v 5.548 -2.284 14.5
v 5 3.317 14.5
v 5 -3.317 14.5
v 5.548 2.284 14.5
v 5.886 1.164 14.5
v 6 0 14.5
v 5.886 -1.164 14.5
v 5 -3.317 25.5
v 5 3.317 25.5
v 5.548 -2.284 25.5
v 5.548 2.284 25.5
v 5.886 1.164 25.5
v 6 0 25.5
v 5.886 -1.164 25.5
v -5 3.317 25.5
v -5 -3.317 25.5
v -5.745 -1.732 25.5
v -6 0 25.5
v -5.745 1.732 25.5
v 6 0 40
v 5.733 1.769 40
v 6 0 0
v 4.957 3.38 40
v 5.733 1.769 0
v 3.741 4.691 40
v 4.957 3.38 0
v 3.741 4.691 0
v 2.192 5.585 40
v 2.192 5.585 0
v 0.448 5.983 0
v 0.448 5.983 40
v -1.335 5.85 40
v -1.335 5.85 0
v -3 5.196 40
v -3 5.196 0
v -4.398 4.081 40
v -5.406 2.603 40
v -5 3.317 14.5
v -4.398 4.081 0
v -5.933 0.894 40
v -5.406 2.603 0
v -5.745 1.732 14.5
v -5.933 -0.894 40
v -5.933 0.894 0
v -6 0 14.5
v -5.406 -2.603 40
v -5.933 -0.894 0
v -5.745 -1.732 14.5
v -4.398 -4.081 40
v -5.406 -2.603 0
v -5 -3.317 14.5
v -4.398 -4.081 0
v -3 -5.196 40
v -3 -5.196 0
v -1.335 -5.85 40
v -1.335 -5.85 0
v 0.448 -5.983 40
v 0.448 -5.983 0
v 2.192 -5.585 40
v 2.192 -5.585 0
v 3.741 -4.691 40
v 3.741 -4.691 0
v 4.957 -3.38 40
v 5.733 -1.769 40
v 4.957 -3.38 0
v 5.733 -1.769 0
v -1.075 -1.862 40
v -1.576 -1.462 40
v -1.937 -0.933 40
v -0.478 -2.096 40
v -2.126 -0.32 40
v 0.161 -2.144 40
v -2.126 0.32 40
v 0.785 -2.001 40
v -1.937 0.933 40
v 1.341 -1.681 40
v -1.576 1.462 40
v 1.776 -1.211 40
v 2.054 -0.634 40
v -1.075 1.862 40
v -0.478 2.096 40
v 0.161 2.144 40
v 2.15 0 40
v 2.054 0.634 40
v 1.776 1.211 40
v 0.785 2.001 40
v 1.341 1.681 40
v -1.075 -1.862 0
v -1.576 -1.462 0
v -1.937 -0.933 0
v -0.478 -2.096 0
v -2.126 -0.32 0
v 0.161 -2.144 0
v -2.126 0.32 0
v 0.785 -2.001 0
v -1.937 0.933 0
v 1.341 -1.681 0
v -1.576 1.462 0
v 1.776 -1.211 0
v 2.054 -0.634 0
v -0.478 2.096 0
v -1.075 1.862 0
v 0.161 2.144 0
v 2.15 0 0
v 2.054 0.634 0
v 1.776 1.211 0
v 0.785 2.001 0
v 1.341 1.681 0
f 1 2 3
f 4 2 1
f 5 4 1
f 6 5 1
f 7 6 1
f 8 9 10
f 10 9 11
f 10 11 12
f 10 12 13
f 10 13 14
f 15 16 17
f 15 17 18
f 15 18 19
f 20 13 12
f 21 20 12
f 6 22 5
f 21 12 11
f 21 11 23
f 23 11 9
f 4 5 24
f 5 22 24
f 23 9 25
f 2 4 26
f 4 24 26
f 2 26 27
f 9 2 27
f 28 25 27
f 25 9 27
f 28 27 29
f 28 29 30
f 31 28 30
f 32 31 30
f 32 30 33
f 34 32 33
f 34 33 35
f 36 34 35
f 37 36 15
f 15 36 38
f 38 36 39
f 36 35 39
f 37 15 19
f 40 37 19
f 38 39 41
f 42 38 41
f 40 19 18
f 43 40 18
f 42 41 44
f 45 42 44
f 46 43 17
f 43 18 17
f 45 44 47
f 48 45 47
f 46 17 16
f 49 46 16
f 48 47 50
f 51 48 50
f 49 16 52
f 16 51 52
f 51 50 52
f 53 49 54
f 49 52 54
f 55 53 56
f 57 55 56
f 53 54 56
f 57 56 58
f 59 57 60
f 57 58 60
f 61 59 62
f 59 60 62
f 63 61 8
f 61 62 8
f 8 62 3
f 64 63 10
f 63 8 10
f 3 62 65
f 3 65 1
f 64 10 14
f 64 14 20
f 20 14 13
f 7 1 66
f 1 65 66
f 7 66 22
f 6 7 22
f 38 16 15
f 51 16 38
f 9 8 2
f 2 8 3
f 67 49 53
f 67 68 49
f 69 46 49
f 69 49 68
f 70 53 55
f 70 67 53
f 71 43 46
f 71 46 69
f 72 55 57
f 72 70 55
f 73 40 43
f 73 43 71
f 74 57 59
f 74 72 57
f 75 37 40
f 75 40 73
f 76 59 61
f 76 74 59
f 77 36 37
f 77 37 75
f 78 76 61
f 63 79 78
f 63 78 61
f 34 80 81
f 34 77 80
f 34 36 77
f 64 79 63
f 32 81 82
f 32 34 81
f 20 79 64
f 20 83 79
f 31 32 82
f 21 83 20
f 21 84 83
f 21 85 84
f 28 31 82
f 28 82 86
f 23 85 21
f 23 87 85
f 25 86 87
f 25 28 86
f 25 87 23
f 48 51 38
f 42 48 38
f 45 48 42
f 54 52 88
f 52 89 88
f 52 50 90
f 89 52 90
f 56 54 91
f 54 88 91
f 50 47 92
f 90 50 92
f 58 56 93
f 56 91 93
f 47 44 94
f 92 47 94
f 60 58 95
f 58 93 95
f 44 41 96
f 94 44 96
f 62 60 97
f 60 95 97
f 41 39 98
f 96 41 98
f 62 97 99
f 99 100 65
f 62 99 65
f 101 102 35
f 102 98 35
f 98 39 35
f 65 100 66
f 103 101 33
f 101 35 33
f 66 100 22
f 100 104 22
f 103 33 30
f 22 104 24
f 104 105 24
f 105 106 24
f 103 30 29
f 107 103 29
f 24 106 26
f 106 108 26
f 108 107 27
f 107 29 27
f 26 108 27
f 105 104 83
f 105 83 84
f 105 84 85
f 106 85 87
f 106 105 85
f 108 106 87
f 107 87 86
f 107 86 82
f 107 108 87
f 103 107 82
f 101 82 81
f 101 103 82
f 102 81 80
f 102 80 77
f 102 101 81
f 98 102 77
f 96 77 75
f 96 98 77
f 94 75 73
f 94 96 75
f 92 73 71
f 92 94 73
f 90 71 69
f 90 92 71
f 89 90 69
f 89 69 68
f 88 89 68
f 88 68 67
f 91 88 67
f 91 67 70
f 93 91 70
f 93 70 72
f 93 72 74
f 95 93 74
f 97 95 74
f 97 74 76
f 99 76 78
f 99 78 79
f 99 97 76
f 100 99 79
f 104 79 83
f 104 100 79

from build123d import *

# Parameters (mm, degrees)
SKETCH_1_R               = 6
SKETCH_1_R_2             = 2.15
EXTRUDE_1_DEPTH          = 40
CUT_EXTRUDE_1_DEPTH      = 41.890096601
CUT_EXTRUDE_1_DEPTH_BACK = 41.890096601
SKETCH_2_W               = 1
SKETCH_2_H               = 11


with BuildPart() as part:
    # Эскиз1 → Бобышка-Вытянуть1 (new body)
    with BuildSketch(Plane.XY):
        Circle(SKETCH_1_R)
        Circle(SKETCH_1_R_2, mode=Mode.SUBTRACT)
    extrude(amount=EXTRUDE_1_DEPTH)

    # Эскиз2 → Вырез-Вытянуть1 (cut, two sides: drawn at the far end of the back side and taken through both)
    with BuildSketch(Plane(origin=(0, 0, 0), x_dir=(1, 0, 0), z_dir=(0, 1, 0)).offset(-CUT_EXTRUDE_1_DEPTH_BACK)):
        with Locations((-5.5, -20)):
            Rectangle(SKETCH_2_W, SKETCH_2_H)
        with Locations((5.5, -20)):
            Rectangle(SKETCH_2_W, SKETCH_2_H)
    extrude(amount=CUT_EXTRUDE_1_DEPTH + CUT_EXTRUDE_1_DEPTH_BACK, mode=Mode.SUBTRACT)


solid = part.part
